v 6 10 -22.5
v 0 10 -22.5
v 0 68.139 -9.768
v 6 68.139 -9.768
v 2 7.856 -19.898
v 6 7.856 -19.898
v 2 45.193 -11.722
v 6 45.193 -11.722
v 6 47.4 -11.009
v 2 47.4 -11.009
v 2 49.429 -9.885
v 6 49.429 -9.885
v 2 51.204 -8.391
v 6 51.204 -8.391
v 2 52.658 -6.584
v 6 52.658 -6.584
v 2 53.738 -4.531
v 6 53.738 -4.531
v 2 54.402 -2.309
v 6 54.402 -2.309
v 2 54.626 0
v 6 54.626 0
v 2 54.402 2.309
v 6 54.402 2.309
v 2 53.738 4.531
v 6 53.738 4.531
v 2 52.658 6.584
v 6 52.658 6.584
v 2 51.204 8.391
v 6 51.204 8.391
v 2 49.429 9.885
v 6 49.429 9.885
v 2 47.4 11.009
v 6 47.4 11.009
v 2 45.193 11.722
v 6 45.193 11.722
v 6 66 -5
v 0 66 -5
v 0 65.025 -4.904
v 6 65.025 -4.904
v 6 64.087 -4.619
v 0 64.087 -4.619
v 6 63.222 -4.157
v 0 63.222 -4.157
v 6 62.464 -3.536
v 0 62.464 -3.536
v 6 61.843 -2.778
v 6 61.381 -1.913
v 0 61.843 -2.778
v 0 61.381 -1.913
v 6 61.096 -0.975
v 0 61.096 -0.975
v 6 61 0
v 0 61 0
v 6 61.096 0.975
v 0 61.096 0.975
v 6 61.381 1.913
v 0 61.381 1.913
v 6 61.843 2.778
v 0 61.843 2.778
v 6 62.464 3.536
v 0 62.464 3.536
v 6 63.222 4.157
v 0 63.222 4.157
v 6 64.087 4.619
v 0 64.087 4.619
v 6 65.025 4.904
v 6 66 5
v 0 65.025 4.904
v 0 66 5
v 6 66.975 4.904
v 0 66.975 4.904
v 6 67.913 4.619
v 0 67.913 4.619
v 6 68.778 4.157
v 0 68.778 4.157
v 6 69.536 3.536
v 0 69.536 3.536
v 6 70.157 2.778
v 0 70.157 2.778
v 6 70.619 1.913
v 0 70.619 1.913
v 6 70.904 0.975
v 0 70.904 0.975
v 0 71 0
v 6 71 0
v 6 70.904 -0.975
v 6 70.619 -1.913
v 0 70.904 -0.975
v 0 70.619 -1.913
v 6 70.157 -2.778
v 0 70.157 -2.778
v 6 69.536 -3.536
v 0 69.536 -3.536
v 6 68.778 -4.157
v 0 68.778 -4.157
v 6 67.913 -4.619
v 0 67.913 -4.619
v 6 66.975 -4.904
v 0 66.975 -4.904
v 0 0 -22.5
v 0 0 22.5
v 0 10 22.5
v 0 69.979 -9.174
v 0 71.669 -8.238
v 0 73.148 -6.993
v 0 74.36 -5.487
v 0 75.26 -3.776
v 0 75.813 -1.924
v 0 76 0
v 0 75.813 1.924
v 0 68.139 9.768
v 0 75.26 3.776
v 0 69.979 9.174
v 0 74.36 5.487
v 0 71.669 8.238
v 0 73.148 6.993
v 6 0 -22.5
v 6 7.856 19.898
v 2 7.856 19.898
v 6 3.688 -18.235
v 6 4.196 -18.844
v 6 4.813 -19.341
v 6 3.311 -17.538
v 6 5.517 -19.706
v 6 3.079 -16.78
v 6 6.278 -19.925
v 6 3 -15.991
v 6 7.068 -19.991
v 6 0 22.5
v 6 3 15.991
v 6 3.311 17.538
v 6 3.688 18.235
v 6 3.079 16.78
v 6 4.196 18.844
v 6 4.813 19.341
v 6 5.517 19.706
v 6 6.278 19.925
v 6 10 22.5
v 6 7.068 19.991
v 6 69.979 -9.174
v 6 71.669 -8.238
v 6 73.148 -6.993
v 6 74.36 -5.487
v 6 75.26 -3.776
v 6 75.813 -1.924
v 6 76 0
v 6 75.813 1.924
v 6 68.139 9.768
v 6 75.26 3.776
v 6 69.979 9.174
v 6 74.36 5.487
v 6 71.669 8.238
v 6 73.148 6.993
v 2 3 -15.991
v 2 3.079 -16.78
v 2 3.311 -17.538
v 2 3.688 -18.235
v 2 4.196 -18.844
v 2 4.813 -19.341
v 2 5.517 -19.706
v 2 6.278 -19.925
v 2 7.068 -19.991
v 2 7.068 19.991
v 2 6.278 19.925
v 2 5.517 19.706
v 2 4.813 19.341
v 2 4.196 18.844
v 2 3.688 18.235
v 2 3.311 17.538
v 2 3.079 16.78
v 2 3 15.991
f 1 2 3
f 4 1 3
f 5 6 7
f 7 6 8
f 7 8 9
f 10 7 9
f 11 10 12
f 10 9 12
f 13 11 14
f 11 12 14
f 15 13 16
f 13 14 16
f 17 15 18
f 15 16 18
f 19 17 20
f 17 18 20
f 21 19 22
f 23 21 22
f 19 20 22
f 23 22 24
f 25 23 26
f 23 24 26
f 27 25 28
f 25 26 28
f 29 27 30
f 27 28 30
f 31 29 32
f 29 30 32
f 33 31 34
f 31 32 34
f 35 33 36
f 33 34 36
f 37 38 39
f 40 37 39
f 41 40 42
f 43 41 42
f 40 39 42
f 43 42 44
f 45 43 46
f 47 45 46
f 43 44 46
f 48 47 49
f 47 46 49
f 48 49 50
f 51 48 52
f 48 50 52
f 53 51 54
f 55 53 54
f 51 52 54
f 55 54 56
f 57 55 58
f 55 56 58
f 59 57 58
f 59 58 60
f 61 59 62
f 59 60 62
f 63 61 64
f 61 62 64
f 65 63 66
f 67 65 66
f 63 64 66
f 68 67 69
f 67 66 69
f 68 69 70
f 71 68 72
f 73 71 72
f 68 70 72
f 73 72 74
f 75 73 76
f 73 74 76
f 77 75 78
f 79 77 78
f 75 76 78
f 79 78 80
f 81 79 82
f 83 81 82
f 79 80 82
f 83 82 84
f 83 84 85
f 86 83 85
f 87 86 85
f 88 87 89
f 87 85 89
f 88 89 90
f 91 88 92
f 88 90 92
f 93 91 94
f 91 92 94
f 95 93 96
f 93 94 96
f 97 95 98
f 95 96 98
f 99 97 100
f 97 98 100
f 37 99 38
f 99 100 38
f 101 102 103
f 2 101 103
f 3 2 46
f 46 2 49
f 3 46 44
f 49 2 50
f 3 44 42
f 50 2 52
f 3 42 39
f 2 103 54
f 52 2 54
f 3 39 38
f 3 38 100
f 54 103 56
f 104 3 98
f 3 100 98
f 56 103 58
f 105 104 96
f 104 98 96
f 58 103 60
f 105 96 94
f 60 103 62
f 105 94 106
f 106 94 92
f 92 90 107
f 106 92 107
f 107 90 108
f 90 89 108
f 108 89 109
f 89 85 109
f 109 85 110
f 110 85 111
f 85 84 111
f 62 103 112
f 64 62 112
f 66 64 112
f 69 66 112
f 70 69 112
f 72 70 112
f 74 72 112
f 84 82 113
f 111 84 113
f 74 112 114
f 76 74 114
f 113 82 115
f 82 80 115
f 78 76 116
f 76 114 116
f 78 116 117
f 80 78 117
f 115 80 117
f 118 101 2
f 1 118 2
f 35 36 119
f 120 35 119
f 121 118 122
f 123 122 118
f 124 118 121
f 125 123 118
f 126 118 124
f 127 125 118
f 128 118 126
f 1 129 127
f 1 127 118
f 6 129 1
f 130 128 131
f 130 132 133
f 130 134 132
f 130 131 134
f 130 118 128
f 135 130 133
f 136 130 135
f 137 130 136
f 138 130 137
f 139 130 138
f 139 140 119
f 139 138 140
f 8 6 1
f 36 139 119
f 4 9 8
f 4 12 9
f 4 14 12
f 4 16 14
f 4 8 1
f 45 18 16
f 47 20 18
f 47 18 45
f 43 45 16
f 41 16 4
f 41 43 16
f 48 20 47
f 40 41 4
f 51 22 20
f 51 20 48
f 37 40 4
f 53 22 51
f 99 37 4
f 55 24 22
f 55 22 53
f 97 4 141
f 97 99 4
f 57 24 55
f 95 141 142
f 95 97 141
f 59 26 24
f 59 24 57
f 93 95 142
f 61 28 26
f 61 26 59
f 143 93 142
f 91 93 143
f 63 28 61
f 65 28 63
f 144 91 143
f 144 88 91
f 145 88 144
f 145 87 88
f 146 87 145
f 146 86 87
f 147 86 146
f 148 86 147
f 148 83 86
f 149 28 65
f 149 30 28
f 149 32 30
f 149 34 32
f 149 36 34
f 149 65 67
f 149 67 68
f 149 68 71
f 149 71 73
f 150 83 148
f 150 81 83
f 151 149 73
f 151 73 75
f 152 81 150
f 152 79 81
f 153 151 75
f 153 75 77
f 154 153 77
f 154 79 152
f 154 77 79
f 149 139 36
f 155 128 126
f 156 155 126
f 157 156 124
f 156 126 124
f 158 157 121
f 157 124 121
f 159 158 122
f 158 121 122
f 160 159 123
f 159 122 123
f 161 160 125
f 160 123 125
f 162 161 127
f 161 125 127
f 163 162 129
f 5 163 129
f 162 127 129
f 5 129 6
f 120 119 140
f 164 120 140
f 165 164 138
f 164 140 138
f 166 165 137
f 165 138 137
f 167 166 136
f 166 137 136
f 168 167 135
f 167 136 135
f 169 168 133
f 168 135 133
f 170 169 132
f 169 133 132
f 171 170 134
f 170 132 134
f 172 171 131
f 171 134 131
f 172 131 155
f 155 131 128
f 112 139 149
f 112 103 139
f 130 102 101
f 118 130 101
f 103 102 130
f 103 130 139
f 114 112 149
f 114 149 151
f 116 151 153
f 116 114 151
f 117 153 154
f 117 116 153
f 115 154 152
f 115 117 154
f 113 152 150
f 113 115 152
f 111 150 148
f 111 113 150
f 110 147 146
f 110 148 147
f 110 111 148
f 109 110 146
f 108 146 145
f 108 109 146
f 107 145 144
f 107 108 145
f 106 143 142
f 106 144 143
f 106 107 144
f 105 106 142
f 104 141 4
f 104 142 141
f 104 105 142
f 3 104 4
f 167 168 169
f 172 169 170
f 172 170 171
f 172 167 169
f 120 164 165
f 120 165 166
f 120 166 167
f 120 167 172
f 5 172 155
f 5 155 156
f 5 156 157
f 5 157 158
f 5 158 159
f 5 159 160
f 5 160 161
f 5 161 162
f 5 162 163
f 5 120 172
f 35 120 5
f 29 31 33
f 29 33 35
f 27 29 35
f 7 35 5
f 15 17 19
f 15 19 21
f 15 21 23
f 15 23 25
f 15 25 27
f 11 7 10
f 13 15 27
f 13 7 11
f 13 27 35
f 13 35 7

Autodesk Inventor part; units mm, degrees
ref_plane "YZ Plane" through (0, 0, 0) normal (1, 0, 0) x (0, 1, 0)
ref_plane "XZ Plane" through (0, 0, 0) normal (0, 1, 0) x (-1, 0, 0)
ref_plane "XY Plane" through (0, 0, 0) normal (0, 0, 1) x (1, 0, 0)
sketch "Sketch1" plane through (0, 0, 0) normal (1, 0, 0) x (0, 1, 0)
  line L0 (0, 22.5) -> (0, -22.5)
  arc A0 (68.1391, -9.7685) -> (68.1391, 9.7685) centre (66, 0) ccw
  line L1 (0, 22.5) -> (10, 22.5)
  line L2 (0, -22.5) -> (10, -22.5)
  line L3 (10, -22.5) -> (68.1391, -9.7685)
  line L4 (10, 22.5) -> (68.1391, 9.7685)
  point P0 (0, 0)
  dimension "d1" = 10
  dimension "d2" = 10
  dimension "d3" = 66
  dimension "d4" = 45
extrude "Extrusion1" add sketch "Sketch1" along normal blind 6
sketch "Sketch2" plane through (6, 0, 0) normal (1, 0, 0) x (0, 0, -1)
  line L0 (-22.5, 0) -> (22.5, 0) projected
  line L1 (22.5, 10) -> (9.7685, 68.1391) projected
  line L2 (-9.7685, 68.1391) -> (-22.5, 10) projected
  line L3 (-11.7222, 45.1931) -> (-19.8985, 7.8557)
  line L4 (-15.9911, 3) -> (15.9911, 3)
  line L5 (19.8985, 7.8557) -> (11.7222, 45.1931)
  arc A0 (11.7222, 45.1931) -> (-11.7222, 45.1931) centre (0, 42.6261) ccw
  arc A1 (-19.8985, 7.8557) -> (-15.9911, 3) centre (-15.9911, 7) ccw
  arc A2 (15.9911, 3) -> (19.8985, 7.8557) centre (15.9911, 7) ccw
  point P0 (0, 0)
  dimension "d8" = 4
  dimension "d9" = 12
  dimension "d10" = 3
  dimension "d11" = 3
  dimension "d12" = 3
extrude "Extrusion2" cut sketch "Sketch2" against normal blind 4
sketch "Sketch3" plane through (6, 0, 0) normal (1, 0, 0) x (0, 0, -1)
  arc A0 (9.7685, 68.1391) -> (-9.7685, 68.1391) centre (0, 66) ccw projected
  point P0 (0, 0)
hole "Hole1" at (6, 66, 0) direction (-1, 0, 0) diameter 10 end through all
properties part number "Bearing High"
